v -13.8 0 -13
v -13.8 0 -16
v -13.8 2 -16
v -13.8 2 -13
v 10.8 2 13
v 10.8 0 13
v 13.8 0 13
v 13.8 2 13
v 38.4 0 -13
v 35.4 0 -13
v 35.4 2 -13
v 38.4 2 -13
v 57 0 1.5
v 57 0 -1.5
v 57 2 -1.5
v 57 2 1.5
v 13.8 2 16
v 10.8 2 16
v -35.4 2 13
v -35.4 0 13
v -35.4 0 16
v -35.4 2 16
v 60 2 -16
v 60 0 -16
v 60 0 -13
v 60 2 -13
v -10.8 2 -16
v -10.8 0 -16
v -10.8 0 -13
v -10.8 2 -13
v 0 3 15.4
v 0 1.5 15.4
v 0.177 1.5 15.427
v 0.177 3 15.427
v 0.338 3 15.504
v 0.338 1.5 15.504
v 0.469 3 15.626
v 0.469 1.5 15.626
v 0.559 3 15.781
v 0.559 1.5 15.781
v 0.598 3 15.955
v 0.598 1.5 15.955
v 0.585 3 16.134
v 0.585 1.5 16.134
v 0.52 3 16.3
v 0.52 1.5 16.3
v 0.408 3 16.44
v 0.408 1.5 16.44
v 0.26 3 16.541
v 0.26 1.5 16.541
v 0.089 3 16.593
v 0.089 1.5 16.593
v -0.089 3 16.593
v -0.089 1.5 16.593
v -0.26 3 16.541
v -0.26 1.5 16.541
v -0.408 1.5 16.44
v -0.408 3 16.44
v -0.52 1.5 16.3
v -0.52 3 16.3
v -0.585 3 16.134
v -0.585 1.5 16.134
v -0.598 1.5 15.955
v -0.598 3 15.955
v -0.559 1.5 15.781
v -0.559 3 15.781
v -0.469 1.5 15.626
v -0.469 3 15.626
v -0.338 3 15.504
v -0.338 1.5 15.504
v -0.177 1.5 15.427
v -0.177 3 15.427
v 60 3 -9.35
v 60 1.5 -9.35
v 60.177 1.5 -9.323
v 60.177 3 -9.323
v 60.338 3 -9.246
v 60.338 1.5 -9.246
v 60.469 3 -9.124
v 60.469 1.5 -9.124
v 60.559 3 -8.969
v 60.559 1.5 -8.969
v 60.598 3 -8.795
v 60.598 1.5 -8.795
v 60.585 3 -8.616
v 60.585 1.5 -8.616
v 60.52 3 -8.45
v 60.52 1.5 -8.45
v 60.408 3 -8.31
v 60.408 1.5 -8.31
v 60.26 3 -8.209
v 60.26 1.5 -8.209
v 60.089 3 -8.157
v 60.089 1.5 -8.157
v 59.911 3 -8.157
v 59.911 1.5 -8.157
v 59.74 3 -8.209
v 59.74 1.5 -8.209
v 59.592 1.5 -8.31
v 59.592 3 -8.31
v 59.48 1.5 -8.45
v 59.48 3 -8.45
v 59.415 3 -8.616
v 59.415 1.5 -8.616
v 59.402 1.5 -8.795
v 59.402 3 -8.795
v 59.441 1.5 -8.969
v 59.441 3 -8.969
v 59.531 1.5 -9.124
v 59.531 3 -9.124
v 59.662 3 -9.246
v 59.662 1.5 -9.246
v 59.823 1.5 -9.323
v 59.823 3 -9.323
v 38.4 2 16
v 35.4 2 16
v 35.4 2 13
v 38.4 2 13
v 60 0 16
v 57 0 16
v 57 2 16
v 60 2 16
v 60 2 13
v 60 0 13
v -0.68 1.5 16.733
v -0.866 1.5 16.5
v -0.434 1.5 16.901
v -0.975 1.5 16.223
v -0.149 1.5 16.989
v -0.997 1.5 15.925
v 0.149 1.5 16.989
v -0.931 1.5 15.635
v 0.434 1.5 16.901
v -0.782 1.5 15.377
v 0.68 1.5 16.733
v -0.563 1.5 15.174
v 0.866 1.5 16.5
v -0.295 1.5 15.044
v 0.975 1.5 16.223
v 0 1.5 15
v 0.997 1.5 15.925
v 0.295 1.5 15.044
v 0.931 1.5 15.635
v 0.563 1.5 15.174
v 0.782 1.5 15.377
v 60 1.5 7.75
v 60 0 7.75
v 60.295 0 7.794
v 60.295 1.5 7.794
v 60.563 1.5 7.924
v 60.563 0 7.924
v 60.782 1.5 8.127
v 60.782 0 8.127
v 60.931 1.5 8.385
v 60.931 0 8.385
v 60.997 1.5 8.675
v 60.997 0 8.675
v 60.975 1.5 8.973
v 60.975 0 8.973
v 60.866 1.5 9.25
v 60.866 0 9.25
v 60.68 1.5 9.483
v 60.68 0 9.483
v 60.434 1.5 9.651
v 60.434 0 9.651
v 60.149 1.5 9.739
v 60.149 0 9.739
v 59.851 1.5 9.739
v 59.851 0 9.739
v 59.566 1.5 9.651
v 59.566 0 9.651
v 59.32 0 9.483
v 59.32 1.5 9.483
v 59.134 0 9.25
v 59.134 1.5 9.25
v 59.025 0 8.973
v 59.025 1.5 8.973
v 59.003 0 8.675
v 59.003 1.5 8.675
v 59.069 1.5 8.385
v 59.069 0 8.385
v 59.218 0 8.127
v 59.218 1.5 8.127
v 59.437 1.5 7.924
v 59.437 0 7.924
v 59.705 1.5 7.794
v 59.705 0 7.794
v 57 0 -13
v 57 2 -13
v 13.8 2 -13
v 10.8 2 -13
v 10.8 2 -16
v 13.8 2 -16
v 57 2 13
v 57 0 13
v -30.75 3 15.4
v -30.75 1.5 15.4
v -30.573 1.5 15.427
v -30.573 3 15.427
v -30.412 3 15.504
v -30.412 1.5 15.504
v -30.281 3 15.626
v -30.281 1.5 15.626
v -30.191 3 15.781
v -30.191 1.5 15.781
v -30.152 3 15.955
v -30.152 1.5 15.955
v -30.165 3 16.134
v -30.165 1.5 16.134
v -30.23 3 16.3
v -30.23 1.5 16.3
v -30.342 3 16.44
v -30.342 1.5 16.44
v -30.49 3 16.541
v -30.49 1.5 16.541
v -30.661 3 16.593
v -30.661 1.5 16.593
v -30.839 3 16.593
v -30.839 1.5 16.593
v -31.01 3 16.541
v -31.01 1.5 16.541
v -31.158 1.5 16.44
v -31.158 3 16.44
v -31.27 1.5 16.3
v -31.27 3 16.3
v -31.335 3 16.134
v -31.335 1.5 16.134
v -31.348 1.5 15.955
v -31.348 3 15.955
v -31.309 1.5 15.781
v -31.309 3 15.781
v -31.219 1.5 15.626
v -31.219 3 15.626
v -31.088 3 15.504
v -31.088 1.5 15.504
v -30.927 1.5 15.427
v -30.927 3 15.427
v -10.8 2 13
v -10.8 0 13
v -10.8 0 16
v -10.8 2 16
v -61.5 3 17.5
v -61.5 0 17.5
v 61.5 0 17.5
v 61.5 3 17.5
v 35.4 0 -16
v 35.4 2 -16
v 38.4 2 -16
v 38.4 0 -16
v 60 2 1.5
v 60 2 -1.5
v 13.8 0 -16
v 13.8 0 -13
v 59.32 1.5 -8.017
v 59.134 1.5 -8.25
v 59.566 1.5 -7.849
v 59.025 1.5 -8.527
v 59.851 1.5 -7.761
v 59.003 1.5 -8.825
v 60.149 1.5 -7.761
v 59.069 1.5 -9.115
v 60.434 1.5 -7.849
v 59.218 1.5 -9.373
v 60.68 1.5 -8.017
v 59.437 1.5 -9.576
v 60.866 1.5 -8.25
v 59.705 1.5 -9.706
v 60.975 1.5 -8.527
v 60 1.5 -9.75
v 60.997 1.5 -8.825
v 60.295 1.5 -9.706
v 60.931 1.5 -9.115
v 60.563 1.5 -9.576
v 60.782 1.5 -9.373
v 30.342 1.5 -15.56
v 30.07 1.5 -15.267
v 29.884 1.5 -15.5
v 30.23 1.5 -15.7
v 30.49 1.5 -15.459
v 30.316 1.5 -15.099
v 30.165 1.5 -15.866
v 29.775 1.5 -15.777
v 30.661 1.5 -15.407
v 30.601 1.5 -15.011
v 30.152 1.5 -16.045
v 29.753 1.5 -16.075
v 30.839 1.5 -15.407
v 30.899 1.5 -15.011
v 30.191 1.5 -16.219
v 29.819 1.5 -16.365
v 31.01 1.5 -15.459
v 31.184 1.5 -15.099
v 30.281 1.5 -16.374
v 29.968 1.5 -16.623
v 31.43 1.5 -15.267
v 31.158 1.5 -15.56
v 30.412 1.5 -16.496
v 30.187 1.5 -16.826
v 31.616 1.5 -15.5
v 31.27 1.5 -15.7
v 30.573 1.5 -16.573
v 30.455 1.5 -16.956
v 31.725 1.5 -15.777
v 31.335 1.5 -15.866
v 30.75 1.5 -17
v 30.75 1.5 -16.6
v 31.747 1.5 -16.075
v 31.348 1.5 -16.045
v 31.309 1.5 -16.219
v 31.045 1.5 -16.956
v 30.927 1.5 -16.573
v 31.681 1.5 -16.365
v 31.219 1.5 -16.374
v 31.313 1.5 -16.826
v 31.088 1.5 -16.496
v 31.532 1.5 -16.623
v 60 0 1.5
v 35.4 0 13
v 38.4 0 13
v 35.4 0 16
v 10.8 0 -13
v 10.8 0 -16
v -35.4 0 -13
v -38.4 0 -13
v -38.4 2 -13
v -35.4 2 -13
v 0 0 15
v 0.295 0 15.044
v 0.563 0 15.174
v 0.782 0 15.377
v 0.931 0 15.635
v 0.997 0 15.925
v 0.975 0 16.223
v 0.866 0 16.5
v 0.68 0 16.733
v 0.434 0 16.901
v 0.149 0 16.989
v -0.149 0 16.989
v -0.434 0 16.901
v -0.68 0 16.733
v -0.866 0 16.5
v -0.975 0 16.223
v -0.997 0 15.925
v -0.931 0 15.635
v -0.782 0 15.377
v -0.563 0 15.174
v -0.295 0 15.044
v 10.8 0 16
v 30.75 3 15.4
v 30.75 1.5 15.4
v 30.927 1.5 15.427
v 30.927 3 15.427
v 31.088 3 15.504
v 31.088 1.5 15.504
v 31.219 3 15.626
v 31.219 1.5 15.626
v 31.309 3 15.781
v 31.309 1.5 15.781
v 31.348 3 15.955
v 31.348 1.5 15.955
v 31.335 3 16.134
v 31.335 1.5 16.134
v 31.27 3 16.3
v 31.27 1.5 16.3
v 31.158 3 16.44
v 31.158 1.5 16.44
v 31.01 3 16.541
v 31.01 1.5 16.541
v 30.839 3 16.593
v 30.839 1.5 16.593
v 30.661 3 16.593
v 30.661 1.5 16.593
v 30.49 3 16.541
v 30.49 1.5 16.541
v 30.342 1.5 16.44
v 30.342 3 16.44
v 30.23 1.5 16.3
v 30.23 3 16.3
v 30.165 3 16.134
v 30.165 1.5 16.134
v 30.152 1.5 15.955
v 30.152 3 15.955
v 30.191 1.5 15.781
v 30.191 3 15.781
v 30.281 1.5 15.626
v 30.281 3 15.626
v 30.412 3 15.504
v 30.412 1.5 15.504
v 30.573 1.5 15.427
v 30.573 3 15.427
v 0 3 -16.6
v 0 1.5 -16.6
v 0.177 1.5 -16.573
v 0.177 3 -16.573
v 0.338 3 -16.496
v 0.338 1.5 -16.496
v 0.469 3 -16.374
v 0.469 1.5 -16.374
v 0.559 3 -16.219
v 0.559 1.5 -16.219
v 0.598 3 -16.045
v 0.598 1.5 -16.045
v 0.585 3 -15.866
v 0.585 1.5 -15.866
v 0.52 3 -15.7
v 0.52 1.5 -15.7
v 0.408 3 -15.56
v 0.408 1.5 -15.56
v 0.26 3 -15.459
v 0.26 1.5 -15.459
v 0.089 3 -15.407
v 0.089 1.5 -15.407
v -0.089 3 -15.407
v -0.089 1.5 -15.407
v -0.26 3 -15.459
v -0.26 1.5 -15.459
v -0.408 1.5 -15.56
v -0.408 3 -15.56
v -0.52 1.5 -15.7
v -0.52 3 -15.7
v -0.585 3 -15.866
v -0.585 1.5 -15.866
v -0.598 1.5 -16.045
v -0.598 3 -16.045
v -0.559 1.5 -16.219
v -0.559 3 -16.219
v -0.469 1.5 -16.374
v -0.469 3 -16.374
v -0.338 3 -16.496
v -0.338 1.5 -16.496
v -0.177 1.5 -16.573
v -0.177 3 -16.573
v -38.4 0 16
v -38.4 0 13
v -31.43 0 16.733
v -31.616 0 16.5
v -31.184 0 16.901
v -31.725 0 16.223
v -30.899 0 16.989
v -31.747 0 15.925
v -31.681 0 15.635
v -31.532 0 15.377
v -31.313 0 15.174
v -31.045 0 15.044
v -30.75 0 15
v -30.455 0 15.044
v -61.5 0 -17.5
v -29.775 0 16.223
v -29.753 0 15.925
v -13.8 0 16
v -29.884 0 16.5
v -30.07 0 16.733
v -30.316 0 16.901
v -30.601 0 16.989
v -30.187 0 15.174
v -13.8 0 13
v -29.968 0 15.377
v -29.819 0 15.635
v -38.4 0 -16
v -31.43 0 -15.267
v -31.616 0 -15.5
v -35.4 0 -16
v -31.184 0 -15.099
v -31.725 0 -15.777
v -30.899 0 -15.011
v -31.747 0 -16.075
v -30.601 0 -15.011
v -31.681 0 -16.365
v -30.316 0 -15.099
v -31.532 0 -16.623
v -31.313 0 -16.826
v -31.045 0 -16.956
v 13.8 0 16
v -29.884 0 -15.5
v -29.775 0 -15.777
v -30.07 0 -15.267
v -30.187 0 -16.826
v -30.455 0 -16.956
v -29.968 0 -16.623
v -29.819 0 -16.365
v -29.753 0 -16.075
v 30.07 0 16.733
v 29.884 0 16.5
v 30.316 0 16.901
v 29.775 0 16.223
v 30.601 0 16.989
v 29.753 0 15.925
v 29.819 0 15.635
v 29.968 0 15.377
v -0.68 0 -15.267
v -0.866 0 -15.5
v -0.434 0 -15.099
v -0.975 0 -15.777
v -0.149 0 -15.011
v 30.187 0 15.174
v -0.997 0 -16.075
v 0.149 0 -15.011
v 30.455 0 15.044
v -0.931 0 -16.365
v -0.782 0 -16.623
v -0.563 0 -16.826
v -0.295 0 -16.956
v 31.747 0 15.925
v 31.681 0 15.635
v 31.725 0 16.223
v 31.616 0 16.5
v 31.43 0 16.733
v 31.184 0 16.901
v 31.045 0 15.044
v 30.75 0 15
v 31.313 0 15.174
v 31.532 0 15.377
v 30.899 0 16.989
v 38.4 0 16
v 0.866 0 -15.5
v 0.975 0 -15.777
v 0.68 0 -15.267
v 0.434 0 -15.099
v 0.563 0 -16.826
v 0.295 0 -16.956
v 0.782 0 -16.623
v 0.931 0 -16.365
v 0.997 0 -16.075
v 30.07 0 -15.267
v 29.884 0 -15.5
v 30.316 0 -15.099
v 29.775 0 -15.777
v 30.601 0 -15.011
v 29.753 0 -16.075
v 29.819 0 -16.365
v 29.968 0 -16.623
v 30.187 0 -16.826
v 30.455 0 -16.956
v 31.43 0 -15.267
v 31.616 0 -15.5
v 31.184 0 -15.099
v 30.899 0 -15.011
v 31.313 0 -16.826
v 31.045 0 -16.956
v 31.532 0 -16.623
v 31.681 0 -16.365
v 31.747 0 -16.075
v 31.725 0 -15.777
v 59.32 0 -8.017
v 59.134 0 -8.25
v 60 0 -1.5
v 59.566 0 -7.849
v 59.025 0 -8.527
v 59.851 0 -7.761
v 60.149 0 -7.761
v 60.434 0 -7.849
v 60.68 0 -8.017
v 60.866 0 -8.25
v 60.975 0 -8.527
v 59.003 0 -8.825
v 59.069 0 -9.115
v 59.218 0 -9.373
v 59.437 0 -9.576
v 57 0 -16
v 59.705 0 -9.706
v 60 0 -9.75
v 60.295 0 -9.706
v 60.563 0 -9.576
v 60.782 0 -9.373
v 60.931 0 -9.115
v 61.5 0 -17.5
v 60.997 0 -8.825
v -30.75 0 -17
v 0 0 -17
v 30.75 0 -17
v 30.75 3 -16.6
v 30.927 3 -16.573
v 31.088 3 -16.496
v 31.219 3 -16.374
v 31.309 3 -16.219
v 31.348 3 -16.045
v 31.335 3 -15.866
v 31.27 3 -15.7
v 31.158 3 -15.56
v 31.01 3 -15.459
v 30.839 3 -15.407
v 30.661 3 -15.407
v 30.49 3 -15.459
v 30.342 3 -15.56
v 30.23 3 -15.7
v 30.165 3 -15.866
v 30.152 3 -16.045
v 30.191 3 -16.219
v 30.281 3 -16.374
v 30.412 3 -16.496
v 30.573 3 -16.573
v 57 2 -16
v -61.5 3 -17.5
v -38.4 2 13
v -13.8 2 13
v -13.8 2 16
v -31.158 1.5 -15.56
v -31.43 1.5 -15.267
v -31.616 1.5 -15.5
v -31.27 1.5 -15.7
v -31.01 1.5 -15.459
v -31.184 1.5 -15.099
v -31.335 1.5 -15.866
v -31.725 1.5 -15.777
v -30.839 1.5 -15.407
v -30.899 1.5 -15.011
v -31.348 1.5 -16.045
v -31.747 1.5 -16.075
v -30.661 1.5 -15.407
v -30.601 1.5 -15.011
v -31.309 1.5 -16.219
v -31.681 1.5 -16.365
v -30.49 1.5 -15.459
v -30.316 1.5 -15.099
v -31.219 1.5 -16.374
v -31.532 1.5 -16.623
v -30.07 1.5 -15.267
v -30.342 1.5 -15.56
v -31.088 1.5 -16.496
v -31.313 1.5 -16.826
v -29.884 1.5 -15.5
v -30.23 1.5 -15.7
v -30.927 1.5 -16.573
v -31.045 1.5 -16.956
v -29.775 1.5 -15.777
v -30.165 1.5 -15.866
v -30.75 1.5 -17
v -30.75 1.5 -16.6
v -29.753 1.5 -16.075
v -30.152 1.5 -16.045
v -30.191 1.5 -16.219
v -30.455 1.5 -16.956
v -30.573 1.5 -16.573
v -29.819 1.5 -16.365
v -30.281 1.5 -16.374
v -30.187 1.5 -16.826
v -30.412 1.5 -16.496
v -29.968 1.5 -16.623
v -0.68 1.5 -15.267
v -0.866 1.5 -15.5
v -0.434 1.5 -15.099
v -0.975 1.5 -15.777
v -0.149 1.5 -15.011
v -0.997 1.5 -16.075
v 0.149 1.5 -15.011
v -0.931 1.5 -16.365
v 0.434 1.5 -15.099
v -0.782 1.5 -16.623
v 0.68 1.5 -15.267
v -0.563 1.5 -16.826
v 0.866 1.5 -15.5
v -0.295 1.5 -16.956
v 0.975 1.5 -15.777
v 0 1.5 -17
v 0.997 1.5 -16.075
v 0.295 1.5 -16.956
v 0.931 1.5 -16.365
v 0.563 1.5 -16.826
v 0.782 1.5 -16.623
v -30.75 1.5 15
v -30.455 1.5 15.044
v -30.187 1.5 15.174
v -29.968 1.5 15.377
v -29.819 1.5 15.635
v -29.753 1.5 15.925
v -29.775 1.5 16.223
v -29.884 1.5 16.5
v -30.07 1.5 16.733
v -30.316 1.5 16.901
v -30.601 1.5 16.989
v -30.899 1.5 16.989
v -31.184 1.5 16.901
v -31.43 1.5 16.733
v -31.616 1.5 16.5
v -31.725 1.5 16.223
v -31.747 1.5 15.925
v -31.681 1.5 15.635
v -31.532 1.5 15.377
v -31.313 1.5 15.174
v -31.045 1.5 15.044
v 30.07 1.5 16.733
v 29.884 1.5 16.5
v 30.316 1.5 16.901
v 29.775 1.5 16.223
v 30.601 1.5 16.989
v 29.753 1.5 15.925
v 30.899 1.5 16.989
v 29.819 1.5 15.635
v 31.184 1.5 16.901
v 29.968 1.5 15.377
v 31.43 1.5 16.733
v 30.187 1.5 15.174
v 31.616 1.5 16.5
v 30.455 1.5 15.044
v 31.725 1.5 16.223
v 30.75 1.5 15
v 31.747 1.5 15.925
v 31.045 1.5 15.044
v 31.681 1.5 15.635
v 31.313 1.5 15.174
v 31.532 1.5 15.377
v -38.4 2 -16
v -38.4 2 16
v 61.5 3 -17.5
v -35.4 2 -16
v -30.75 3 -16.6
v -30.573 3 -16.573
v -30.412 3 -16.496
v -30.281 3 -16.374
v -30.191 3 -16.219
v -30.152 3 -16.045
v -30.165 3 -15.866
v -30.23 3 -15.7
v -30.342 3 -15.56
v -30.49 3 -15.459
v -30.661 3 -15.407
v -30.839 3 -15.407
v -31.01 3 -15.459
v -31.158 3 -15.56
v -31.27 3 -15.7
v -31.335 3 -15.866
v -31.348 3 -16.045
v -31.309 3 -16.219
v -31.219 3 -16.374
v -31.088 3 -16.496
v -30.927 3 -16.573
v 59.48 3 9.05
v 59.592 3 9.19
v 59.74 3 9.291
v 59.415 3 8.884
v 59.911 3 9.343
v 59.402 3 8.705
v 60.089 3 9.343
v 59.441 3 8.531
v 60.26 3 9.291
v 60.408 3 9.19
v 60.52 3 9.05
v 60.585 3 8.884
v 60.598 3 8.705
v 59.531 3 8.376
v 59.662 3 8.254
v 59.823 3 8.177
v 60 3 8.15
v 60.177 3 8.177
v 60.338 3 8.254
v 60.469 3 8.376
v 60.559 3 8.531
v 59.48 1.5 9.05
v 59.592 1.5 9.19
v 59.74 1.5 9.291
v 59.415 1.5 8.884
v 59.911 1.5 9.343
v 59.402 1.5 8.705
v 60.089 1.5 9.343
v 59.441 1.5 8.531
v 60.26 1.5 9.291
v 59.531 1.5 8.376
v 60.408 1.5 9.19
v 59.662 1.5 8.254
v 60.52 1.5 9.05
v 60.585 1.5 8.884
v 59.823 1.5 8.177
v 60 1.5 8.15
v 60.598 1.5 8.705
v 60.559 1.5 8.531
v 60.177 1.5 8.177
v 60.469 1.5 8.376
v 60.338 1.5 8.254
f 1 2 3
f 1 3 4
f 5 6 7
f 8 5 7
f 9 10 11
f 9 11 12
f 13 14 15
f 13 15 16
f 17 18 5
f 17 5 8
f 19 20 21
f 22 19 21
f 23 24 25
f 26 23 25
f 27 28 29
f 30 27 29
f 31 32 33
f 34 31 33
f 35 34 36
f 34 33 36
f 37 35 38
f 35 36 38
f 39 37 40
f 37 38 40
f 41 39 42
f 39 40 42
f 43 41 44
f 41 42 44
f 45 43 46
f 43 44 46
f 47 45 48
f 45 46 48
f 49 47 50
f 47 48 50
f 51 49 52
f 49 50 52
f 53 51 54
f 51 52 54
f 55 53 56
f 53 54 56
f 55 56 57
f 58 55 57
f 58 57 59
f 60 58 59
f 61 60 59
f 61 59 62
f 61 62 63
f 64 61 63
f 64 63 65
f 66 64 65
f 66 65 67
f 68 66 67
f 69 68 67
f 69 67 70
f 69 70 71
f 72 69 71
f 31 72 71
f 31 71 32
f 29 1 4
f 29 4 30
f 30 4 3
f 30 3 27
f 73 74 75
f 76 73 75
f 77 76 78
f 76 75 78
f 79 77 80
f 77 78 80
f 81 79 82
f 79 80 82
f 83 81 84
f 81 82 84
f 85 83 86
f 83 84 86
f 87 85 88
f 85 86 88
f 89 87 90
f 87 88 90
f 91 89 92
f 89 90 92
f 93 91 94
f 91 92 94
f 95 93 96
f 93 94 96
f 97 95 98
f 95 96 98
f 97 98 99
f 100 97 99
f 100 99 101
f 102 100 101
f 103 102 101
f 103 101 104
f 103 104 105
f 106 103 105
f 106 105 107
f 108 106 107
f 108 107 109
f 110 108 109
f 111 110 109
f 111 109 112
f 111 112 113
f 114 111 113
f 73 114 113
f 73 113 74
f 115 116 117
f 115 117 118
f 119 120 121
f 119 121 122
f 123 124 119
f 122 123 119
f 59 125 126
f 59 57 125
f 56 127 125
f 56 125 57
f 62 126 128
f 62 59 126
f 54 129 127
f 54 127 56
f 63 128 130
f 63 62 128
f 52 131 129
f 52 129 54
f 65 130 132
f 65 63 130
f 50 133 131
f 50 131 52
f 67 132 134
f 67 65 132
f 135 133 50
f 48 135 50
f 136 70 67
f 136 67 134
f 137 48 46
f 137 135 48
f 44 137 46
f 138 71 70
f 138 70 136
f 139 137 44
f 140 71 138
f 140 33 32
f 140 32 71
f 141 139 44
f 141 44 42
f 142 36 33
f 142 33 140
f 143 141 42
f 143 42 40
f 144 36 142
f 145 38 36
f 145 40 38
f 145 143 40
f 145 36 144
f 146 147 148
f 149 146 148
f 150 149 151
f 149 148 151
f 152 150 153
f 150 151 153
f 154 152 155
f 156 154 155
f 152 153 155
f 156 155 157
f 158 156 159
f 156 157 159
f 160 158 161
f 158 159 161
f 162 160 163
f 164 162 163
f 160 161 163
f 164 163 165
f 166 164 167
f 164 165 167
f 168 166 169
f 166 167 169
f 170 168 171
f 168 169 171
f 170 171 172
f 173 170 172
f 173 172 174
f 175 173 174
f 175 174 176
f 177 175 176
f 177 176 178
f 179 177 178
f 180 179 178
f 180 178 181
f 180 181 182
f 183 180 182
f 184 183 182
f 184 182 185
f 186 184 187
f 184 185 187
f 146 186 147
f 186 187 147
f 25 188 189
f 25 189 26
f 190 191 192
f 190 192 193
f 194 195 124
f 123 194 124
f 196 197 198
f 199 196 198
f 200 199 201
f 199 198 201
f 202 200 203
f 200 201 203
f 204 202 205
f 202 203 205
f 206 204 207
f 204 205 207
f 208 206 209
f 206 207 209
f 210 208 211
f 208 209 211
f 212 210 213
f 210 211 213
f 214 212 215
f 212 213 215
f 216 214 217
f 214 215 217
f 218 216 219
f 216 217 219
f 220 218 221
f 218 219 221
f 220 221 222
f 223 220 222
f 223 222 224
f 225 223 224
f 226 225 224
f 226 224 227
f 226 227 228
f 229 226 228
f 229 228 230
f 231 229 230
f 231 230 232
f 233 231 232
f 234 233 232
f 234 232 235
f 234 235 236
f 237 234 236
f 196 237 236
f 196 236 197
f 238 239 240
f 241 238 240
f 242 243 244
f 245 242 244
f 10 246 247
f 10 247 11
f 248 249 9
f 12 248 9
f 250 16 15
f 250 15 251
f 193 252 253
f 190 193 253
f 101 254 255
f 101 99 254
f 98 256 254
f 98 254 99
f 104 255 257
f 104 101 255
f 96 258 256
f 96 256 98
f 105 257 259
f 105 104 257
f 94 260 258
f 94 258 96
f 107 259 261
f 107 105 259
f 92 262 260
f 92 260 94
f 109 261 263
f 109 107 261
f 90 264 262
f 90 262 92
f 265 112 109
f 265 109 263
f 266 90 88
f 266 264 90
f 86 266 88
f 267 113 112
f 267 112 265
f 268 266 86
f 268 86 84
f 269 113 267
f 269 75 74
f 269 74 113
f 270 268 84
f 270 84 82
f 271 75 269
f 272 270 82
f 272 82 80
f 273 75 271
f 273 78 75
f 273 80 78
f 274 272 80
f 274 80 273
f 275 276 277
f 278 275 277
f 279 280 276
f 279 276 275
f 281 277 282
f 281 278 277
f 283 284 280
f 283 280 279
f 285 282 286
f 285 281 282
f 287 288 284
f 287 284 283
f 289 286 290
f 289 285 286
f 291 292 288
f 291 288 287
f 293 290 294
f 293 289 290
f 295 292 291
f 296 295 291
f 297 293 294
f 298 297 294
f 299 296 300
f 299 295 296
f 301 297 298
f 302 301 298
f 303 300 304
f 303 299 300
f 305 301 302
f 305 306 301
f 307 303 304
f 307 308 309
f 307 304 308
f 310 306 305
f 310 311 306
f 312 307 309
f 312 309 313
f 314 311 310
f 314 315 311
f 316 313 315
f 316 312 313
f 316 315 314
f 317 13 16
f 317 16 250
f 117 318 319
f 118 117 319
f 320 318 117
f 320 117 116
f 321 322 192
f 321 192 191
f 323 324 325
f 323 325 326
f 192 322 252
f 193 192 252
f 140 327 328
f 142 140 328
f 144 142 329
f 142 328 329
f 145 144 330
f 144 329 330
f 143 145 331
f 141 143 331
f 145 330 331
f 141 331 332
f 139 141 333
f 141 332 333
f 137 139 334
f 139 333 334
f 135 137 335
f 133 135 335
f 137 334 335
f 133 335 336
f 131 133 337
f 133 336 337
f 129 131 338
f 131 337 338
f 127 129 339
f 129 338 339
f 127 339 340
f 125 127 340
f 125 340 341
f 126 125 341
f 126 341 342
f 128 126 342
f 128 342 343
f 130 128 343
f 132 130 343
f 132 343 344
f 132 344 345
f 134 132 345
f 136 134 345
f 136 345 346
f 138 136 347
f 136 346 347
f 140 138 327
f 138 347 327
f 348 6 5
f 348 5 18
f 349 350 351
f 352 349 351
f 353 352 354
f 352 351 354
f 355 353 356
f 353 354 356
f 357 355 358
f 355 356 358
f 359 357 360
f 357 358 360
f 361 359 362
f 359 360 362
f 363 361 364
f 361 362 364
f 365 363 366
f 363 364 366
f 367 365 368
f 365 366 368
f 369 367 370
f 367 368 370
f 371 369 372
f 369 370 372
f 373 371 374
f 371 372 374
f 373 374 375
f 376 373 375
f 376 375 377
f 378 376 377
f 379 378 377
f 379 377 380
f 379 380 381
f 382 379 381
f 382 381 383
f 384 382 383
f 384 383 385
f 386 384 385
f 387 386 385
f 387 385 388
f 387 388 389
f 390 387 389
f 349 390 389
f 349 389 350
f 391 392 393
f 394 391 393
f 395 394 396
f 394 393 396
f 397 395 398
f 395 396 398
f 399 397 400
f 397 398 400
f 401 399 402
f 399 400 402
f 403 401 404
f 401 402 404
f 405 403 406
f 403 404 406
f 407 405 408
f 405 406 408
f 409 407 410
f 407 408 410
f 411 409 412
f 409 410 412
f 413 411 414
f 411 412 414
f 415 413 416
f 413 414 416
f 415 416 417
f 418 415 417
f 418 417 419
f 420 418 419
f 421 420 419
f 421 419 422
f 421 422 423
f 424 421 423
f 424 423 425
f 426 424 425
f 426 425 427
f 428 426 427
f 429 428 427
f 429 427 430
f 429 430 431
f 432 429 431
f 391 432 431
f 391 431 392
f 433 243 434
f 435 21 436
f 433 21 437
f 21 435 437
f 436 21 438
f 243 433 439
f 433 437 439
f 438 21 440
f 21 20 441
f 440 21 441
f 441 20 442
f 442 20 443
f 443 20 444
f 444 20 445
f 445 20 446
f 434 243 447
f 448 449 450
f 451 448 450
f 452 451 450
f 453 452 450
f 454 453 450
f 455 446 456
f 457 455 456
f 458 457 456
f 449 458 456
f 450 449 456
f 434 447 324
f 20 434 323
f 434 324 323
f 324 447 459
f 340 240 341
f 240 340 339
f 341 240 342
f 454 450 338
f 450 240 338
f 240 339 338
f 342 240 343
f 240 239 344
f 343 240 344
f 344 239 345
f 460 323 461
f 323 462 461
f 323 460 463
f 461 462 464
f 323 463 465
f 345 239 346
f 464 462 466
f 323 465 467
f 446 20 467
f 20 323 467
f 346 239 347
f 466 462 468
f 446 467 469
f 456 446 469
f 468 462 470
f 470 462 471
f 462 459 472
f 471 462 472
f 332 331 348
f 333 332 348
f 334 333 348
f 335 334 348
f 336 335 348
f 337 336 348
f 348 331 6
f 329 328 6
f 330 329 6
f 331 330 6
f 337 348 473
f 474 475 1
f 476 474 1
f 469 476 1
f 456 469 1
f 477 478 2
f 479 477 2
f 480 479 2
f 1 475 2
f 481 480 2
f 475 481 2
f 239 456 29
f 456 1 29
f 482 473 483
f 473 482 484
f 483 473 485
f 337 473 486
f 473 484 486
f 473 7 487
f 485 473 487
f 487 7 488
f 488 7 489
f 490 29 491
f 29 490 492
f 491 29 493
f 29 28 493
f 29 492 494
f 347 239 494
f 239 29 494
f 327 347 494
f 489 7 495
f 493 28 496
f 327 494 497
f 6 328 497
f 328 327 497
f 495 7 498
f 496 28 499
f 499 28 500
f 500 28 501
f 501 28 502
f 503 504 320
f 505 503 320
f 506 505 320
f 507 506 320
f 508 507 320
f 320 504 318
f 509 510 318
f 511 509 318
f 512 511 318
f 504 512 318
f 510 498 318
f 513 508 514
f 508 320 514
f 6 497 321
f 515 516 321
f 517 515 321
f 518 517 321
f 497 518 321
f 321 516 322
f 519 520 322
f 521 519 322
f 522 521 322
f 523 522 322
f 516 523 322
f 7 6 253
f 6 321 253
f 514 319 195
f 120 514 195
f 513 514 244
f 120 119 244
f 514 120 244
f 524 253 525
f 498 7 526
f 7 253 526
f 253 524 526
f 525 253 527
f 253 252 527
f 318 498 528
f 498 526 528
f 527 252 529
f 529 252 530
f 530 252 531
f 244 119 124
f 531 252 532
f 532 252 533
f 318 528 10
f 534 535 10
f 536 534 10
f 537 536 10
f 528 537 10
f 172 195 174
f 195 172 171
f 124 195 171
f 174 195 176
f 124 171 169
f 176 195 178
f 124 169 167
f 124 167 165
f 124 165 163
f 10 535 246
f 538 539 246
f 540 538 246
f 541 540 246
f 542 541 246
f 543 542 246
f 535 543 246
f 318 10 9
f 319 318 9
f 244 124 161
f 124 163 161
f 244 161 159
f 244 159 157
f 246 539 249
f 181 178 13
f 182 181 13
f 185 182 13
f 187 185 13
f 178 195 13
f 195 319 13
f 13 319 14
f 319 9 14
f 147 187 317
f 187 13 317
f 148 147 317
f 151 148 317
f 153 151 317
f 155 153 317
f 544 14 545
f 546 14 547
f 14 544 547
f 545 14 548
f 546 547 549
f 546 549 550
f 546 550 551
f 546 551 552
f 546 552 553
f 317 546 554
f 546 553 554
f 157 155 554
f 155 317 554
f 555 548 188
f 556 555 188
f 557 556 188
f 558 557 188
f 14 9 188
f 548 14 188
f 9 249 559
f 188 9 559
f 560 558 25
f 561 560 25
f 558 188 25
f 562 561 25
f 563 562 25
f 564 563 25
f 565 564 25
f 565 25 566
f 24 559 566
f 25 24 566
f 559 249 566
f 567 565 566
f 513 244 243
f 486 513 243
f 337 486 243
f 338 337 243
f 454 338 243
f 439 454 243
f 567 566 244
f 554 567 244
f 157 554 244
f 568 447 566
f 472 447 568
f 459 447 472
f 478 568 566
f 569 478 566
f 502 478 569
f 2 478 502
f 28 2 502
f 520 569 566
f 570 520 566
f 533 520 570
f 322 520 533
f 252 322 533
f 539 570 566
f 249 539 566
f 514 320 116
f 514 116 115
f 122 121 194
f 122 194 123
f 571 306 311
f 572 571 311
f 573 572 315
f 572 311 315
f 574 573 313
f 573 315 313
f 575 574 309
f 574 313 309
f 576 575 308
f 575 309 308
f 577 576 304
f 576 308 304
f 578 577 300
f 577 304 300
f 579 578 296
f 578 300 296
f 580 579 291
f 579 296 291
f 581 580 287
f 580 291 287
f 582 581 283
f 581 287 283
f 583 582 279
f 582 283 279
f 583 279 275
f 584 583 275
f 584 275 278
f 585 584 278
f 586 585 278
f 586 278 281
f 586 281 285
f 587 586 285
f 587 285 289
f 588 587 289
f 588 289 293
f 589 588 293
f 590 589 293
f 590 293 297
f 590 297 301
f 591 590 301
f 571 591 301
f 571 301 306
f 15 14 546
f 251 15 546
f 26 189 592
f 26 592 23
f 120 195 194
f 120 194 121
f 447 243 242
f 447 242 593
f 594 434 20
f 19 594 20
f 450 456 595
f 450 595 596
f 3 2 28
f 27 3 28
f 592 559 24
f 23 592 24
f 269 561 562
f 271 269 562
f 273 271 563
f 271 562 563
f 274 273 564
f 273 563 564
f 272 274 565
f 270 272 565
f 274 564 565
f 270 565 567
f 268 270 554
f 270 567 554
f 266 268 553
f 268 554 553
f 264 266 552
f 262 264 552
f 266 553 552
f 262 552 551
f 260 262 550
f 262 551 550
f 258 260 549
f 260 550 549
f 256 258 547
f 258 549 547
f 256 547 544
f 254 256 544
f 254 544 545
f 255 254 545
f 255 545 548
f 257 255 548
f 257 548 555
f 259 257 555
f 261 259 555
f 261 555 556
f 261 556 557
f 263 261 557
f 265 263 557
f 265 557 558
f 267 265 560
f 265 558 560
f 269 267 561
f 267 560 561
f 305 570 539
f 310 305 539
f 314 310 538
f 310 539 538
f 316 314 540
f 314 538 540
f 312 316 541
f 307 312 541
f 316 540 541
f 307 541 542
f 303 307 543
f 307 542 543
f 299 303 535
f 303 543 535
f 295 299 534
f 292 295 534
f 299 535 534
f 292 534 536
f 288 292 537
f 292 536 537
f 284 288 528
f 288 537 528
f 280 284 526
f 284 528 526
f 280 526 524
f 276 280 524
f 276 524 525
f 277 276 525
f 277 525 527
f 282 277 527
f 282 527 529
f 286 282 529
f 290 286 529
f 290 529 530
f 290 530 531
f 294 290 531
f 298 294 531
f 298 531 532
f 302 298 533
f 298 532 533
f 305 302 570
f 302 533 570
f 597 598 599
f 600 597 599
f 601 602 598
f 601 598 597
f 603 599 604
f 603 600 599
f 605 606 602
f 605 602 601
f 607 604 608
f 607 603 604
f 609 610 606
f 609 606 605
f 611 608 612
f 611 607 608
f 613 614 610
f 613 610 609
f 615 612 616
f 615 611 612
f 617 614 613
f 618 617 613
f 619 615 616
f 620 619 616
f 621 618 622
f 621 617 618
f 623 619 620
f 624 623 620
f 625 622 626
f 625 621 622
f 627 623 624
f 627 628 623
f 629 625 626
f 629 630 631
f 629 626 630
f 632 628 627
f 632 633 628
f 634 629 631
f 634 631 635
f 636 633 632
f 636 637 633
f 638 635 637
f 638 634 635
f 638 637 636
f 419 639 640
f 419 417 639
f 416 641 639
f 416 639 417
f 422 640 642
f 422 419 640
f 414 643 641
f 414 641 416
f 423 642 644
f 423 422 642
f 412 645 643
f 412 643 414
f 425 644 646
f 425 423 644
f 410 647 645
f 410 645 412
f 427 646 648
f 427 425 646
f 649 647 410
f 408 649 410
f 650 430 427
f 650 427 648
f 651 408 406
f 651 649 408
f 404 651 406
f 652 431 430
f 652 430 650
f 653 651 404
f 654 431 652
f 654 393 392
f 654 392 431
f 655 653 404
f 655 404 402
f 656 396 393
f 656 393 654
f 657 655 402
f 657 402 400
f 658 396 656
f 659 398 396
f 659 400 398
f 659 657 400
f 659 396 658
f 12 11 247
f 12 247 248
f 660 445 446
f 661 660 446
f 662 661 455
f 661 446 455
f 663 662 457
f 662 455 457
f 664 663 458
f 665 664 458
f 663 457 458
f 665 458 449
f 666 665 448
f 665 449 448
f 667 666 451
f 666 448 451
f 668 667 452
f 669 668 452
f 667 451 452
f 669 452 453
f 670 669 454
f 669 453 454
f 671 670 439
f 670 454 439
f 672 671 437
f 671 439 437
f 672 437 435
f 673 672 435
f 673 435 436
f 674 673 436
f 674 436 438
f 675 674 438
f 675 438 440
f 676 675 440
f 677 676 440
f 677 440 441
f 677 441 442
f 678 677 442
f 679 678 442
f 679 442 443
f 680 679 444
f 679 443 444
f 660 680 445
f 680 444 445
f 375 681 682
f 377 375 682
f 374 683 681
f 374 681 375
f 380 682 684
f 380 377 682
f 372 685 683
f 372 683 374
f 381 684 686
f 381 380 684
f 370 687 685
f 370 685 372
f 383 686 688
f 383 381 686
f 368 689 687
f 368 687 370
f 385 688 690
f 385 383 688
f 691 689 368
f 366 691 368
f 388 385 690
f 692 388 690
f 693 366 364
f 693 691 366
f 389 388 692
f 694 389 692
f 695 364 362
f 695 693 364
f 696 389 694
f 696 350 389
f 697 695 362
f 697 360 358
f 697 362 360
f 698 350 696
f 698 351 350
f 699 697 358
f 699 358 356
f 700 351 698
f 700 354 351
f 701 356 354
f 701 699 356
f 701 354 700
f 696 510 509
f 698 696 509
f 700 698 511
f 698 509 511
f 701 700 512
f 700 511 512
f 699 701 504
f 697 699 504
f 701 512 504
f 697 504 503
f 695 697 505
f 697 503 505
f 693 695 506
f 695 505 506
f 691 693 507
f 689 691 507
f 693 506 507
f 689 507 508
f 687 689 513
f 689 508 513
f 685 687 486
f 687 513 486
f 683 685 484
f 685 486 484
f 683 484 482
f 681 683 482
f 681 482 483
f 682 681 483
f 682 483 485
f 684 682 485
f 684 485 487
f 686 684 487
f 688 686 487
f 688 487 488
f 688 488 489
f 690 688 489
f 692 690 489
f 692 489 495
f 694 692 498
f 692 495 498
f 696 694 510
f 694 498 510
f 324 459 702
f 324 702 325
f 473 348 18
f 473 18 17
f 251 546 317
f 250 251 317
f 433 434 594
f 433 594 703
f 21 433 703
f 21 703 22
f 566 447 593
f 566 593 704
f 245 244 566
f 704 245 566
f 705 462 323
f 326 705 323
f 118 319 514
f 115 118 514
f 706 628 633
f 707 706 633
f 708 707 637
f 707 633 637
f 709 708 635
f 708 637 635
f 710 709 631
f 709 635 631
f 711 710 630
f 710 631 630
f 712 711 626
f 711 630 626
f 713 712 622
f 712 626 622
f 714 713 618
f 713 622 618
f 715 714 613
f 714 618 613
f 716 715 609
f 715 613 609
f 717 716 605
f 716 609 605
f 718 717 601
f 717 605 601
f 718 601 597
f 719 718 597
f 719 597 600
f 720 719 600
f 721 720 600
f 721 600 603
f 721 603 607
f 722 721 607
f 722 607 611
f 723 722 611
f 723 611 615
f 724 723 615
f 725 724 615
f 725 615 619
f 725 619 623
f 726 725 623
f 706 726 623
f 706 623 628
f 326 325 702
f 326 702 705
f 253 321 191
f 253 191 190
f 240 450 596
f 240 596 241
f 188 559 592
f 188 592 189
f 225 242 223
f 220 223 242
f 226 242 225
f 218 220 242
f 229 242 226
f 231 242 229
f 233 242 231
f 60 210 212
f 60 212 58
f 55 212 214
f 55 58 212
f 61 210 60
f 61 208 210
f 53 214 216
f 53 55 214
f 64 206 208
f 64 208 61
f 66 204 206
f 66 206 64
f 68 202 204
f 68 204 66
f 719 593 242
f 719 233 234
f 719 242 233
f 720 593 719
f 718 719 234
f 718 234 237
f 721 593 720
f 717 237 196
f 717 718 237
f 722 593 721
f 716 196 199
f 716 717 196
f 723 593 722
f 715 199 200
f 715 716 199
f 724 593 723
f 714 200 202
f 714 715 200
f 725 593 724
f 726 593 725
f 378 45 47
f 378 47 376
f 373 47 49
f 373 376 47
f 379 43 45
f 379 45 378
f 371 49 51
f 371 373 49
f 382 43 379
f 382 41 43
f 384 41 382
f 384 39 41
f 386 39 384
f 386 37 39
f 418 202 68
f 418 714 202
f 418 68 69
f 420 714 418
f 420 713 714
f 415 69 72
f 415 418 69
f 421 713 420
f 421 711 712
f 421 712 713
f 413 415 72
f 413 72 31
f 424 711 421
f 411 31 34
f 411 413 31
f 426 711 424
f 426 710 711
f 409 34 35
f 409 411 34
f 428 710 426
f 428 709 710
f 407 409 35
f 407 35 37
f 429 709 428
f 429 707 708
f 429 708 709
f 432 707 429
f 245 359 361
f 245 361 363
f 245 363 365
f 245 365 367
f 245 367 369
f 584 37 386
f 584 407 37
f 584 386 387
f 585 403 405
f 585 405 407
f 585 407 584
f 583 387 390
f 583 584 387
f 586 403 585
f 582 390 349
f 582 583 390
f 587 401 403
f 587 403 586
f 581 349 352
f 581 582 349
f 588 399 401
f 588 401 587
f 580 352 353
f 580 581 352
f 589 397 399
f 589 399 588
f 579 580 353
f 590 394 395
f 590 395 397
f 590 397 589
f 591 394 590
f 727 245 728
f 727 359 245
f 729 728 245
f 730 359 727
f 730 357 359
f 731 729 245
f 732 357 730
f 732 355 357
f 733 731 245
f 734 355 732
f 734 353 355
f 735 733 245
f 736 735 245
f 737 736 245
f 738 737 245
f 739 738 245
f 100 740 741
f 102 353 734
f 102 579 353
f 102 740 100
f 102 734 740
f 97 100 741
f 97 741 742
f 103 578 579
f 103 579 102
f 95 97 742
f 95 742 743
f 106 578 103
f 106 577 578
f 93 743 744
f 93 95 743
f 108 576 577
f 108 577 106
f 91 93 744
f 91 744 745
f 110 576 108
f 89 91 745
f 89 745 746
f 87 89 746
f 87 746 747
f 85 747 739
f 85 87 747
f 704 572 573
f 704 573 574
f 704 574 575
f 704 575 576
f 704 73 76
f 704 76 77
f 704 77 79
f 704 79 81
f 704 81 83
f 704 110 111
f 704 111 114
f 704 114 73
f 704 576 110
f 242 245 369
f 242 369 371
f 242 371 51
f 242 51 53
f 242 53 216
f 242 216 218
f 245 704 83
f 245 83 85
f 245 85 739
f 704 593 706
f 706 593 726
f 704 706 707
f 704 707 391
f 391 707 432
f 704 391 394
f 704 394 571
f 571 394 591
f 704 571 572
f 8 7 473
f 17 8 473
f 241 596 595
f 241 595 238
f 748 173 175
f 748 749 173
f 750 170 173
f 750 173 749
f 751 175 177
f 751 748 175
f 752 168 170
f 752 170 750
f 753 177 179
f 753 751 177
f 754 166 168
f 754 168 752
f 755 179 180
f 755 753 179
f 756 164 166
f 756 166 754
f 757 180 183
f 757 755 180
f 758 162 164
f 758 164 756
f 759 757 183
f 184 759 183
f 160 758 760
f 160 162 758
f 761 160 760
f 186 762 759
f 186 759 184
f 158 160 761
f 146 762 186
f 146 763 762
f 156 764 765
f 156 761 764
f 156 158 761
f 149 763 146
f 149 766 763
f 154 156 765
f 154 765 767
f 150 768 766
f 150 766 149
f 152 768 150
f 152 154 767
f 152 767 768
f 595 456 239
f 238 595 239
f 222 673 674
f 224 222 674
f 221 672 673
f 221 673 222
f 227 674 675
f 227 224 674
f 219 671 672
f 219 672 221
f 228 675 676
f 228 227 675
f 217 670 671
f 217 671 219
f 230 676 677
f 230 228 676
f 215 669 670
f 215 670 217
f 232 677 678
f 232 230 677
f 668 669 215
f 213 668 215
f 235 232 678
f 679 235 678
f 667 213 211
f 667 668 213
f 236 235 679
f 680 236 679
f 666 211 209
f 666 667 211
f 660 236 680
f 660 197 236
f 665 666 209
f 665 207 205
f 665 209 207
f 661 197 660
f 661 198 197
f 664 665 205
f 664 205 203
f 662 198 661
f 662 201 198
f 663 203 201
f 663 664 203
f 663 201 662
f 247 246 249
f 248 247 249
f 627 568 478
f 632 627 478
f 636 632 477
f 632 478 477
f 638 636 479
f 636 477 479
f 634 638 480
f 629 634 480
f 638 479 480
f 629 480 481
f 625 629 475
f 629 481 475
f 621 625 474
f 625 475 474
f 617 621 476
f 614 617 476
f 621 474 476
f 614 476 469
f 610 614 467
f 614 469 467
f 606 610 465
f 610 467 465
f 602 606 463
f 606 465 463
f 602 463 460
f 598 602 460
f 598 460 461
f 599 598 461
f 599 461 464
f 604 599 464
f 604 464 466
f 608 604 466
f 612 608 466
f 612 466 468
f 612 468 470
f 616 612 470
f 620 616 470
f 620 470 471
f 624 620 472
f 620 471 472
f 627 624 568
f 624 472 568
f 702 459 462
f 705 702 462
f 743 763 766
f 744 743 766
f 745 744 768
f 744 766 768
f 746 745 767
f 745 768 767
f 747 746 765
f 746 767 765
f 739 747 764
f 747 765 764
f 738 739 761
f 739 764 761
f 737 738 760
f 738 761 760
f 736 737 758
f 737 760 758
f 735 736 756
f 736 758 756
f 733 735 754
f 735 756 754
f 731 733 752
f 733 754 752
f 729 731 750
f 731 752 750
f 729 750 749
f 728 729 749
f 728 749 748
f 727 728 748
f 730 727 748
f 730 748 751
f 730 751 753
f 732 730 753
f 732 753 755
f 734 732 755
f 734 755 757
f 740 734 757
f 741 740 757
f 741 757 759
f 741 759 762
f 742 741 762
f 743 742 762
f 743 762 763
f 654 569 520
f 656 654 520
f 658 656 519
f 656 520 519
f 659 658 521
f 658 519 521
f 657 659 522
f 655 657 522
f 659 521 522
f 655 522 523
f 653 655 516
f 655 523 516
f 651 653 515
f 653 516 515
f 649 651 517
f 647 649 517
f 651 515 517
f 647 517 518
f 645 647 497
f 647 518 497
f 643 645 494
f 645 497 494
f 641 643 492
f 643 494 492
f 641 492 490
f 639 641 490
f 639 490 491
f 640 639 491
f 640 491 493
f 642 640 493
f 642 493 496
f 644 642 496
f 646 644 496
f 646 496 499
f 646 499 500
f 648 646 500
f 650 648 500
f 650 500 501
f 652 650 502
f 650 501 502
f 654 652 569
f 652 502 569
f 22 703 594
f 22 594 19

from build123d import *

# Parameters (mm, degrees)
SKETCH_1_W          = 123
SKETCH_1_H          = 35
EXTRUDE_1_DEPTH     = 3
SKETCH_2_R          = 0.6
CUT_EXTRUDE_1_DEPTH = 65.011717677
SKETCH_2_3_R        = 1
CUT_EXTRUDE_2_DEPTH = 1.5
SKETCH_3_W          = 3
SKETCH_3_H          = 3
CUT_EXTRUDE_3_DEPTH = 2


with BuildPart() as part:
    # 草图1 → 凸台-拉伸1 (new body)
    with BuildSketch(Plane(origin=(0, 0, 0), x_dir=(1, 0, 0), z_dir=(0, 1, 0))):
        Rectangle(SKETCH_1_W, SKETCH_1_H)
    extrude(amount=EXTRUDE_1_DEPTH)

    # 草图2 → 切除-拉伸1 (cut, through all)
    with BuildSketch(Plane.XZ):
        with Locations((-30.75, 16)):
            Circle(SKETCH_2_R)
        with Locations((30.75, 16)):
            Circle(SKETCH_2_R)
        with Locations((-30.75, -16)):
            Circle(SKETCH_2_R)
        with Locations((30.75, -16)):
            Circle(SKETCH_2_R)
        with Locations((0, 16)):
            Circle(SKETCH_2_R)
        with Locations((0, -16)):
            Circle(SKETCH_2_R)
        with Locations((60, 8.75)):
            Circle(SKETCH_2_R)
        with Locations((60, -8.75)):
            Circle(SKETCH_2_R)
    extrude(amount=-CUT_EXTRUDE_1_DEPTH, mode=Mode.SUBTRACT)

    # 草图2<3> → 切除-拉伸2 (cut)
    with BuildSketch(Plane.XZ):
        with Locations((-30.75, 16)):
            Circle(SKETCH_2_3_R)
        with Locations((30.75, 16)):
            Circle(SKETCH_2_3_R)
        with Locations((-30.75, -16)):
            Circle(SKETCH_2_3_R)
        with Locations((30.75, -16)):
            Circle(SKETCH_2_3_R)
        with Locations((0, 16)):
            Circle(SKETCH_2_3_R)
        with Locations((0, -16)):
            Circle(SKETCH_2_3_R)
        with Locations((60, 8.75)):
            Circle(SKETCH_2_3_R)
        with Locations((60, -8.75)):
            Circle(SKETCH_2_3_R)
    extrude(amount=-CUT_EXTRUDE_2_DEPTH, mode=Mode.SUBTRACT)

    # 草图3 → 切除-拉伸3 (cut)
    with BuildSketch(Plane.XZ):
        with Locations((58.5, -14.5)):
            Rectangle(SKETCH_3_W, SKETCH_3_H)
        with Locations((58.5, 14.5)):
            Rectangle(SKETCH_3_W, SKETCH_3_H)
        with Locations((58.5, 0)):
            Rectangle(SKETCH_3_W, SKETCH_3_H)
        with Locations((36.9, 14.5)):
            Rectangle(SKETCH_3_W, SKETCH_3_H)
        with Locations((12.3, 14.5)):
            Rectangle(SKETCH_3_W, SKETCH_3_H)
        with Locations((-12.3, 14.5)):
            Rectangle(SKETCH_3_W, SKETCH_3_H)
        with Locations((-36.9, 14.5)):
            Rectangle(SKETCH_3_W, SKETCH_3_H)
        with Locations((36.9, -14.5)):
            Rectangle(SKETCH_3_W, SKETCH_3_H)
        with Locations((36.896881316, -95.946698649)):
            Rectangle(SKETCH_3_W, SKETCH_3_H)
        with Locations((12.3, -14.5)):
            Rectangle(SKETCH_3_W, SKETCH_3_H)
        with Locations((-12.3, -14.5)):
            Rectangle(SKETCH_3_W, SKETCH_3_H)
        with Locations((-36.9, -14.5)):
            Rectangle(SKETCH_3_W, SKETCH_3_H)
    extrude(amount=-CUT_EXTRUDE_3_DEPTH, mode=Mode.SUBTRACT)


solid = part.part
